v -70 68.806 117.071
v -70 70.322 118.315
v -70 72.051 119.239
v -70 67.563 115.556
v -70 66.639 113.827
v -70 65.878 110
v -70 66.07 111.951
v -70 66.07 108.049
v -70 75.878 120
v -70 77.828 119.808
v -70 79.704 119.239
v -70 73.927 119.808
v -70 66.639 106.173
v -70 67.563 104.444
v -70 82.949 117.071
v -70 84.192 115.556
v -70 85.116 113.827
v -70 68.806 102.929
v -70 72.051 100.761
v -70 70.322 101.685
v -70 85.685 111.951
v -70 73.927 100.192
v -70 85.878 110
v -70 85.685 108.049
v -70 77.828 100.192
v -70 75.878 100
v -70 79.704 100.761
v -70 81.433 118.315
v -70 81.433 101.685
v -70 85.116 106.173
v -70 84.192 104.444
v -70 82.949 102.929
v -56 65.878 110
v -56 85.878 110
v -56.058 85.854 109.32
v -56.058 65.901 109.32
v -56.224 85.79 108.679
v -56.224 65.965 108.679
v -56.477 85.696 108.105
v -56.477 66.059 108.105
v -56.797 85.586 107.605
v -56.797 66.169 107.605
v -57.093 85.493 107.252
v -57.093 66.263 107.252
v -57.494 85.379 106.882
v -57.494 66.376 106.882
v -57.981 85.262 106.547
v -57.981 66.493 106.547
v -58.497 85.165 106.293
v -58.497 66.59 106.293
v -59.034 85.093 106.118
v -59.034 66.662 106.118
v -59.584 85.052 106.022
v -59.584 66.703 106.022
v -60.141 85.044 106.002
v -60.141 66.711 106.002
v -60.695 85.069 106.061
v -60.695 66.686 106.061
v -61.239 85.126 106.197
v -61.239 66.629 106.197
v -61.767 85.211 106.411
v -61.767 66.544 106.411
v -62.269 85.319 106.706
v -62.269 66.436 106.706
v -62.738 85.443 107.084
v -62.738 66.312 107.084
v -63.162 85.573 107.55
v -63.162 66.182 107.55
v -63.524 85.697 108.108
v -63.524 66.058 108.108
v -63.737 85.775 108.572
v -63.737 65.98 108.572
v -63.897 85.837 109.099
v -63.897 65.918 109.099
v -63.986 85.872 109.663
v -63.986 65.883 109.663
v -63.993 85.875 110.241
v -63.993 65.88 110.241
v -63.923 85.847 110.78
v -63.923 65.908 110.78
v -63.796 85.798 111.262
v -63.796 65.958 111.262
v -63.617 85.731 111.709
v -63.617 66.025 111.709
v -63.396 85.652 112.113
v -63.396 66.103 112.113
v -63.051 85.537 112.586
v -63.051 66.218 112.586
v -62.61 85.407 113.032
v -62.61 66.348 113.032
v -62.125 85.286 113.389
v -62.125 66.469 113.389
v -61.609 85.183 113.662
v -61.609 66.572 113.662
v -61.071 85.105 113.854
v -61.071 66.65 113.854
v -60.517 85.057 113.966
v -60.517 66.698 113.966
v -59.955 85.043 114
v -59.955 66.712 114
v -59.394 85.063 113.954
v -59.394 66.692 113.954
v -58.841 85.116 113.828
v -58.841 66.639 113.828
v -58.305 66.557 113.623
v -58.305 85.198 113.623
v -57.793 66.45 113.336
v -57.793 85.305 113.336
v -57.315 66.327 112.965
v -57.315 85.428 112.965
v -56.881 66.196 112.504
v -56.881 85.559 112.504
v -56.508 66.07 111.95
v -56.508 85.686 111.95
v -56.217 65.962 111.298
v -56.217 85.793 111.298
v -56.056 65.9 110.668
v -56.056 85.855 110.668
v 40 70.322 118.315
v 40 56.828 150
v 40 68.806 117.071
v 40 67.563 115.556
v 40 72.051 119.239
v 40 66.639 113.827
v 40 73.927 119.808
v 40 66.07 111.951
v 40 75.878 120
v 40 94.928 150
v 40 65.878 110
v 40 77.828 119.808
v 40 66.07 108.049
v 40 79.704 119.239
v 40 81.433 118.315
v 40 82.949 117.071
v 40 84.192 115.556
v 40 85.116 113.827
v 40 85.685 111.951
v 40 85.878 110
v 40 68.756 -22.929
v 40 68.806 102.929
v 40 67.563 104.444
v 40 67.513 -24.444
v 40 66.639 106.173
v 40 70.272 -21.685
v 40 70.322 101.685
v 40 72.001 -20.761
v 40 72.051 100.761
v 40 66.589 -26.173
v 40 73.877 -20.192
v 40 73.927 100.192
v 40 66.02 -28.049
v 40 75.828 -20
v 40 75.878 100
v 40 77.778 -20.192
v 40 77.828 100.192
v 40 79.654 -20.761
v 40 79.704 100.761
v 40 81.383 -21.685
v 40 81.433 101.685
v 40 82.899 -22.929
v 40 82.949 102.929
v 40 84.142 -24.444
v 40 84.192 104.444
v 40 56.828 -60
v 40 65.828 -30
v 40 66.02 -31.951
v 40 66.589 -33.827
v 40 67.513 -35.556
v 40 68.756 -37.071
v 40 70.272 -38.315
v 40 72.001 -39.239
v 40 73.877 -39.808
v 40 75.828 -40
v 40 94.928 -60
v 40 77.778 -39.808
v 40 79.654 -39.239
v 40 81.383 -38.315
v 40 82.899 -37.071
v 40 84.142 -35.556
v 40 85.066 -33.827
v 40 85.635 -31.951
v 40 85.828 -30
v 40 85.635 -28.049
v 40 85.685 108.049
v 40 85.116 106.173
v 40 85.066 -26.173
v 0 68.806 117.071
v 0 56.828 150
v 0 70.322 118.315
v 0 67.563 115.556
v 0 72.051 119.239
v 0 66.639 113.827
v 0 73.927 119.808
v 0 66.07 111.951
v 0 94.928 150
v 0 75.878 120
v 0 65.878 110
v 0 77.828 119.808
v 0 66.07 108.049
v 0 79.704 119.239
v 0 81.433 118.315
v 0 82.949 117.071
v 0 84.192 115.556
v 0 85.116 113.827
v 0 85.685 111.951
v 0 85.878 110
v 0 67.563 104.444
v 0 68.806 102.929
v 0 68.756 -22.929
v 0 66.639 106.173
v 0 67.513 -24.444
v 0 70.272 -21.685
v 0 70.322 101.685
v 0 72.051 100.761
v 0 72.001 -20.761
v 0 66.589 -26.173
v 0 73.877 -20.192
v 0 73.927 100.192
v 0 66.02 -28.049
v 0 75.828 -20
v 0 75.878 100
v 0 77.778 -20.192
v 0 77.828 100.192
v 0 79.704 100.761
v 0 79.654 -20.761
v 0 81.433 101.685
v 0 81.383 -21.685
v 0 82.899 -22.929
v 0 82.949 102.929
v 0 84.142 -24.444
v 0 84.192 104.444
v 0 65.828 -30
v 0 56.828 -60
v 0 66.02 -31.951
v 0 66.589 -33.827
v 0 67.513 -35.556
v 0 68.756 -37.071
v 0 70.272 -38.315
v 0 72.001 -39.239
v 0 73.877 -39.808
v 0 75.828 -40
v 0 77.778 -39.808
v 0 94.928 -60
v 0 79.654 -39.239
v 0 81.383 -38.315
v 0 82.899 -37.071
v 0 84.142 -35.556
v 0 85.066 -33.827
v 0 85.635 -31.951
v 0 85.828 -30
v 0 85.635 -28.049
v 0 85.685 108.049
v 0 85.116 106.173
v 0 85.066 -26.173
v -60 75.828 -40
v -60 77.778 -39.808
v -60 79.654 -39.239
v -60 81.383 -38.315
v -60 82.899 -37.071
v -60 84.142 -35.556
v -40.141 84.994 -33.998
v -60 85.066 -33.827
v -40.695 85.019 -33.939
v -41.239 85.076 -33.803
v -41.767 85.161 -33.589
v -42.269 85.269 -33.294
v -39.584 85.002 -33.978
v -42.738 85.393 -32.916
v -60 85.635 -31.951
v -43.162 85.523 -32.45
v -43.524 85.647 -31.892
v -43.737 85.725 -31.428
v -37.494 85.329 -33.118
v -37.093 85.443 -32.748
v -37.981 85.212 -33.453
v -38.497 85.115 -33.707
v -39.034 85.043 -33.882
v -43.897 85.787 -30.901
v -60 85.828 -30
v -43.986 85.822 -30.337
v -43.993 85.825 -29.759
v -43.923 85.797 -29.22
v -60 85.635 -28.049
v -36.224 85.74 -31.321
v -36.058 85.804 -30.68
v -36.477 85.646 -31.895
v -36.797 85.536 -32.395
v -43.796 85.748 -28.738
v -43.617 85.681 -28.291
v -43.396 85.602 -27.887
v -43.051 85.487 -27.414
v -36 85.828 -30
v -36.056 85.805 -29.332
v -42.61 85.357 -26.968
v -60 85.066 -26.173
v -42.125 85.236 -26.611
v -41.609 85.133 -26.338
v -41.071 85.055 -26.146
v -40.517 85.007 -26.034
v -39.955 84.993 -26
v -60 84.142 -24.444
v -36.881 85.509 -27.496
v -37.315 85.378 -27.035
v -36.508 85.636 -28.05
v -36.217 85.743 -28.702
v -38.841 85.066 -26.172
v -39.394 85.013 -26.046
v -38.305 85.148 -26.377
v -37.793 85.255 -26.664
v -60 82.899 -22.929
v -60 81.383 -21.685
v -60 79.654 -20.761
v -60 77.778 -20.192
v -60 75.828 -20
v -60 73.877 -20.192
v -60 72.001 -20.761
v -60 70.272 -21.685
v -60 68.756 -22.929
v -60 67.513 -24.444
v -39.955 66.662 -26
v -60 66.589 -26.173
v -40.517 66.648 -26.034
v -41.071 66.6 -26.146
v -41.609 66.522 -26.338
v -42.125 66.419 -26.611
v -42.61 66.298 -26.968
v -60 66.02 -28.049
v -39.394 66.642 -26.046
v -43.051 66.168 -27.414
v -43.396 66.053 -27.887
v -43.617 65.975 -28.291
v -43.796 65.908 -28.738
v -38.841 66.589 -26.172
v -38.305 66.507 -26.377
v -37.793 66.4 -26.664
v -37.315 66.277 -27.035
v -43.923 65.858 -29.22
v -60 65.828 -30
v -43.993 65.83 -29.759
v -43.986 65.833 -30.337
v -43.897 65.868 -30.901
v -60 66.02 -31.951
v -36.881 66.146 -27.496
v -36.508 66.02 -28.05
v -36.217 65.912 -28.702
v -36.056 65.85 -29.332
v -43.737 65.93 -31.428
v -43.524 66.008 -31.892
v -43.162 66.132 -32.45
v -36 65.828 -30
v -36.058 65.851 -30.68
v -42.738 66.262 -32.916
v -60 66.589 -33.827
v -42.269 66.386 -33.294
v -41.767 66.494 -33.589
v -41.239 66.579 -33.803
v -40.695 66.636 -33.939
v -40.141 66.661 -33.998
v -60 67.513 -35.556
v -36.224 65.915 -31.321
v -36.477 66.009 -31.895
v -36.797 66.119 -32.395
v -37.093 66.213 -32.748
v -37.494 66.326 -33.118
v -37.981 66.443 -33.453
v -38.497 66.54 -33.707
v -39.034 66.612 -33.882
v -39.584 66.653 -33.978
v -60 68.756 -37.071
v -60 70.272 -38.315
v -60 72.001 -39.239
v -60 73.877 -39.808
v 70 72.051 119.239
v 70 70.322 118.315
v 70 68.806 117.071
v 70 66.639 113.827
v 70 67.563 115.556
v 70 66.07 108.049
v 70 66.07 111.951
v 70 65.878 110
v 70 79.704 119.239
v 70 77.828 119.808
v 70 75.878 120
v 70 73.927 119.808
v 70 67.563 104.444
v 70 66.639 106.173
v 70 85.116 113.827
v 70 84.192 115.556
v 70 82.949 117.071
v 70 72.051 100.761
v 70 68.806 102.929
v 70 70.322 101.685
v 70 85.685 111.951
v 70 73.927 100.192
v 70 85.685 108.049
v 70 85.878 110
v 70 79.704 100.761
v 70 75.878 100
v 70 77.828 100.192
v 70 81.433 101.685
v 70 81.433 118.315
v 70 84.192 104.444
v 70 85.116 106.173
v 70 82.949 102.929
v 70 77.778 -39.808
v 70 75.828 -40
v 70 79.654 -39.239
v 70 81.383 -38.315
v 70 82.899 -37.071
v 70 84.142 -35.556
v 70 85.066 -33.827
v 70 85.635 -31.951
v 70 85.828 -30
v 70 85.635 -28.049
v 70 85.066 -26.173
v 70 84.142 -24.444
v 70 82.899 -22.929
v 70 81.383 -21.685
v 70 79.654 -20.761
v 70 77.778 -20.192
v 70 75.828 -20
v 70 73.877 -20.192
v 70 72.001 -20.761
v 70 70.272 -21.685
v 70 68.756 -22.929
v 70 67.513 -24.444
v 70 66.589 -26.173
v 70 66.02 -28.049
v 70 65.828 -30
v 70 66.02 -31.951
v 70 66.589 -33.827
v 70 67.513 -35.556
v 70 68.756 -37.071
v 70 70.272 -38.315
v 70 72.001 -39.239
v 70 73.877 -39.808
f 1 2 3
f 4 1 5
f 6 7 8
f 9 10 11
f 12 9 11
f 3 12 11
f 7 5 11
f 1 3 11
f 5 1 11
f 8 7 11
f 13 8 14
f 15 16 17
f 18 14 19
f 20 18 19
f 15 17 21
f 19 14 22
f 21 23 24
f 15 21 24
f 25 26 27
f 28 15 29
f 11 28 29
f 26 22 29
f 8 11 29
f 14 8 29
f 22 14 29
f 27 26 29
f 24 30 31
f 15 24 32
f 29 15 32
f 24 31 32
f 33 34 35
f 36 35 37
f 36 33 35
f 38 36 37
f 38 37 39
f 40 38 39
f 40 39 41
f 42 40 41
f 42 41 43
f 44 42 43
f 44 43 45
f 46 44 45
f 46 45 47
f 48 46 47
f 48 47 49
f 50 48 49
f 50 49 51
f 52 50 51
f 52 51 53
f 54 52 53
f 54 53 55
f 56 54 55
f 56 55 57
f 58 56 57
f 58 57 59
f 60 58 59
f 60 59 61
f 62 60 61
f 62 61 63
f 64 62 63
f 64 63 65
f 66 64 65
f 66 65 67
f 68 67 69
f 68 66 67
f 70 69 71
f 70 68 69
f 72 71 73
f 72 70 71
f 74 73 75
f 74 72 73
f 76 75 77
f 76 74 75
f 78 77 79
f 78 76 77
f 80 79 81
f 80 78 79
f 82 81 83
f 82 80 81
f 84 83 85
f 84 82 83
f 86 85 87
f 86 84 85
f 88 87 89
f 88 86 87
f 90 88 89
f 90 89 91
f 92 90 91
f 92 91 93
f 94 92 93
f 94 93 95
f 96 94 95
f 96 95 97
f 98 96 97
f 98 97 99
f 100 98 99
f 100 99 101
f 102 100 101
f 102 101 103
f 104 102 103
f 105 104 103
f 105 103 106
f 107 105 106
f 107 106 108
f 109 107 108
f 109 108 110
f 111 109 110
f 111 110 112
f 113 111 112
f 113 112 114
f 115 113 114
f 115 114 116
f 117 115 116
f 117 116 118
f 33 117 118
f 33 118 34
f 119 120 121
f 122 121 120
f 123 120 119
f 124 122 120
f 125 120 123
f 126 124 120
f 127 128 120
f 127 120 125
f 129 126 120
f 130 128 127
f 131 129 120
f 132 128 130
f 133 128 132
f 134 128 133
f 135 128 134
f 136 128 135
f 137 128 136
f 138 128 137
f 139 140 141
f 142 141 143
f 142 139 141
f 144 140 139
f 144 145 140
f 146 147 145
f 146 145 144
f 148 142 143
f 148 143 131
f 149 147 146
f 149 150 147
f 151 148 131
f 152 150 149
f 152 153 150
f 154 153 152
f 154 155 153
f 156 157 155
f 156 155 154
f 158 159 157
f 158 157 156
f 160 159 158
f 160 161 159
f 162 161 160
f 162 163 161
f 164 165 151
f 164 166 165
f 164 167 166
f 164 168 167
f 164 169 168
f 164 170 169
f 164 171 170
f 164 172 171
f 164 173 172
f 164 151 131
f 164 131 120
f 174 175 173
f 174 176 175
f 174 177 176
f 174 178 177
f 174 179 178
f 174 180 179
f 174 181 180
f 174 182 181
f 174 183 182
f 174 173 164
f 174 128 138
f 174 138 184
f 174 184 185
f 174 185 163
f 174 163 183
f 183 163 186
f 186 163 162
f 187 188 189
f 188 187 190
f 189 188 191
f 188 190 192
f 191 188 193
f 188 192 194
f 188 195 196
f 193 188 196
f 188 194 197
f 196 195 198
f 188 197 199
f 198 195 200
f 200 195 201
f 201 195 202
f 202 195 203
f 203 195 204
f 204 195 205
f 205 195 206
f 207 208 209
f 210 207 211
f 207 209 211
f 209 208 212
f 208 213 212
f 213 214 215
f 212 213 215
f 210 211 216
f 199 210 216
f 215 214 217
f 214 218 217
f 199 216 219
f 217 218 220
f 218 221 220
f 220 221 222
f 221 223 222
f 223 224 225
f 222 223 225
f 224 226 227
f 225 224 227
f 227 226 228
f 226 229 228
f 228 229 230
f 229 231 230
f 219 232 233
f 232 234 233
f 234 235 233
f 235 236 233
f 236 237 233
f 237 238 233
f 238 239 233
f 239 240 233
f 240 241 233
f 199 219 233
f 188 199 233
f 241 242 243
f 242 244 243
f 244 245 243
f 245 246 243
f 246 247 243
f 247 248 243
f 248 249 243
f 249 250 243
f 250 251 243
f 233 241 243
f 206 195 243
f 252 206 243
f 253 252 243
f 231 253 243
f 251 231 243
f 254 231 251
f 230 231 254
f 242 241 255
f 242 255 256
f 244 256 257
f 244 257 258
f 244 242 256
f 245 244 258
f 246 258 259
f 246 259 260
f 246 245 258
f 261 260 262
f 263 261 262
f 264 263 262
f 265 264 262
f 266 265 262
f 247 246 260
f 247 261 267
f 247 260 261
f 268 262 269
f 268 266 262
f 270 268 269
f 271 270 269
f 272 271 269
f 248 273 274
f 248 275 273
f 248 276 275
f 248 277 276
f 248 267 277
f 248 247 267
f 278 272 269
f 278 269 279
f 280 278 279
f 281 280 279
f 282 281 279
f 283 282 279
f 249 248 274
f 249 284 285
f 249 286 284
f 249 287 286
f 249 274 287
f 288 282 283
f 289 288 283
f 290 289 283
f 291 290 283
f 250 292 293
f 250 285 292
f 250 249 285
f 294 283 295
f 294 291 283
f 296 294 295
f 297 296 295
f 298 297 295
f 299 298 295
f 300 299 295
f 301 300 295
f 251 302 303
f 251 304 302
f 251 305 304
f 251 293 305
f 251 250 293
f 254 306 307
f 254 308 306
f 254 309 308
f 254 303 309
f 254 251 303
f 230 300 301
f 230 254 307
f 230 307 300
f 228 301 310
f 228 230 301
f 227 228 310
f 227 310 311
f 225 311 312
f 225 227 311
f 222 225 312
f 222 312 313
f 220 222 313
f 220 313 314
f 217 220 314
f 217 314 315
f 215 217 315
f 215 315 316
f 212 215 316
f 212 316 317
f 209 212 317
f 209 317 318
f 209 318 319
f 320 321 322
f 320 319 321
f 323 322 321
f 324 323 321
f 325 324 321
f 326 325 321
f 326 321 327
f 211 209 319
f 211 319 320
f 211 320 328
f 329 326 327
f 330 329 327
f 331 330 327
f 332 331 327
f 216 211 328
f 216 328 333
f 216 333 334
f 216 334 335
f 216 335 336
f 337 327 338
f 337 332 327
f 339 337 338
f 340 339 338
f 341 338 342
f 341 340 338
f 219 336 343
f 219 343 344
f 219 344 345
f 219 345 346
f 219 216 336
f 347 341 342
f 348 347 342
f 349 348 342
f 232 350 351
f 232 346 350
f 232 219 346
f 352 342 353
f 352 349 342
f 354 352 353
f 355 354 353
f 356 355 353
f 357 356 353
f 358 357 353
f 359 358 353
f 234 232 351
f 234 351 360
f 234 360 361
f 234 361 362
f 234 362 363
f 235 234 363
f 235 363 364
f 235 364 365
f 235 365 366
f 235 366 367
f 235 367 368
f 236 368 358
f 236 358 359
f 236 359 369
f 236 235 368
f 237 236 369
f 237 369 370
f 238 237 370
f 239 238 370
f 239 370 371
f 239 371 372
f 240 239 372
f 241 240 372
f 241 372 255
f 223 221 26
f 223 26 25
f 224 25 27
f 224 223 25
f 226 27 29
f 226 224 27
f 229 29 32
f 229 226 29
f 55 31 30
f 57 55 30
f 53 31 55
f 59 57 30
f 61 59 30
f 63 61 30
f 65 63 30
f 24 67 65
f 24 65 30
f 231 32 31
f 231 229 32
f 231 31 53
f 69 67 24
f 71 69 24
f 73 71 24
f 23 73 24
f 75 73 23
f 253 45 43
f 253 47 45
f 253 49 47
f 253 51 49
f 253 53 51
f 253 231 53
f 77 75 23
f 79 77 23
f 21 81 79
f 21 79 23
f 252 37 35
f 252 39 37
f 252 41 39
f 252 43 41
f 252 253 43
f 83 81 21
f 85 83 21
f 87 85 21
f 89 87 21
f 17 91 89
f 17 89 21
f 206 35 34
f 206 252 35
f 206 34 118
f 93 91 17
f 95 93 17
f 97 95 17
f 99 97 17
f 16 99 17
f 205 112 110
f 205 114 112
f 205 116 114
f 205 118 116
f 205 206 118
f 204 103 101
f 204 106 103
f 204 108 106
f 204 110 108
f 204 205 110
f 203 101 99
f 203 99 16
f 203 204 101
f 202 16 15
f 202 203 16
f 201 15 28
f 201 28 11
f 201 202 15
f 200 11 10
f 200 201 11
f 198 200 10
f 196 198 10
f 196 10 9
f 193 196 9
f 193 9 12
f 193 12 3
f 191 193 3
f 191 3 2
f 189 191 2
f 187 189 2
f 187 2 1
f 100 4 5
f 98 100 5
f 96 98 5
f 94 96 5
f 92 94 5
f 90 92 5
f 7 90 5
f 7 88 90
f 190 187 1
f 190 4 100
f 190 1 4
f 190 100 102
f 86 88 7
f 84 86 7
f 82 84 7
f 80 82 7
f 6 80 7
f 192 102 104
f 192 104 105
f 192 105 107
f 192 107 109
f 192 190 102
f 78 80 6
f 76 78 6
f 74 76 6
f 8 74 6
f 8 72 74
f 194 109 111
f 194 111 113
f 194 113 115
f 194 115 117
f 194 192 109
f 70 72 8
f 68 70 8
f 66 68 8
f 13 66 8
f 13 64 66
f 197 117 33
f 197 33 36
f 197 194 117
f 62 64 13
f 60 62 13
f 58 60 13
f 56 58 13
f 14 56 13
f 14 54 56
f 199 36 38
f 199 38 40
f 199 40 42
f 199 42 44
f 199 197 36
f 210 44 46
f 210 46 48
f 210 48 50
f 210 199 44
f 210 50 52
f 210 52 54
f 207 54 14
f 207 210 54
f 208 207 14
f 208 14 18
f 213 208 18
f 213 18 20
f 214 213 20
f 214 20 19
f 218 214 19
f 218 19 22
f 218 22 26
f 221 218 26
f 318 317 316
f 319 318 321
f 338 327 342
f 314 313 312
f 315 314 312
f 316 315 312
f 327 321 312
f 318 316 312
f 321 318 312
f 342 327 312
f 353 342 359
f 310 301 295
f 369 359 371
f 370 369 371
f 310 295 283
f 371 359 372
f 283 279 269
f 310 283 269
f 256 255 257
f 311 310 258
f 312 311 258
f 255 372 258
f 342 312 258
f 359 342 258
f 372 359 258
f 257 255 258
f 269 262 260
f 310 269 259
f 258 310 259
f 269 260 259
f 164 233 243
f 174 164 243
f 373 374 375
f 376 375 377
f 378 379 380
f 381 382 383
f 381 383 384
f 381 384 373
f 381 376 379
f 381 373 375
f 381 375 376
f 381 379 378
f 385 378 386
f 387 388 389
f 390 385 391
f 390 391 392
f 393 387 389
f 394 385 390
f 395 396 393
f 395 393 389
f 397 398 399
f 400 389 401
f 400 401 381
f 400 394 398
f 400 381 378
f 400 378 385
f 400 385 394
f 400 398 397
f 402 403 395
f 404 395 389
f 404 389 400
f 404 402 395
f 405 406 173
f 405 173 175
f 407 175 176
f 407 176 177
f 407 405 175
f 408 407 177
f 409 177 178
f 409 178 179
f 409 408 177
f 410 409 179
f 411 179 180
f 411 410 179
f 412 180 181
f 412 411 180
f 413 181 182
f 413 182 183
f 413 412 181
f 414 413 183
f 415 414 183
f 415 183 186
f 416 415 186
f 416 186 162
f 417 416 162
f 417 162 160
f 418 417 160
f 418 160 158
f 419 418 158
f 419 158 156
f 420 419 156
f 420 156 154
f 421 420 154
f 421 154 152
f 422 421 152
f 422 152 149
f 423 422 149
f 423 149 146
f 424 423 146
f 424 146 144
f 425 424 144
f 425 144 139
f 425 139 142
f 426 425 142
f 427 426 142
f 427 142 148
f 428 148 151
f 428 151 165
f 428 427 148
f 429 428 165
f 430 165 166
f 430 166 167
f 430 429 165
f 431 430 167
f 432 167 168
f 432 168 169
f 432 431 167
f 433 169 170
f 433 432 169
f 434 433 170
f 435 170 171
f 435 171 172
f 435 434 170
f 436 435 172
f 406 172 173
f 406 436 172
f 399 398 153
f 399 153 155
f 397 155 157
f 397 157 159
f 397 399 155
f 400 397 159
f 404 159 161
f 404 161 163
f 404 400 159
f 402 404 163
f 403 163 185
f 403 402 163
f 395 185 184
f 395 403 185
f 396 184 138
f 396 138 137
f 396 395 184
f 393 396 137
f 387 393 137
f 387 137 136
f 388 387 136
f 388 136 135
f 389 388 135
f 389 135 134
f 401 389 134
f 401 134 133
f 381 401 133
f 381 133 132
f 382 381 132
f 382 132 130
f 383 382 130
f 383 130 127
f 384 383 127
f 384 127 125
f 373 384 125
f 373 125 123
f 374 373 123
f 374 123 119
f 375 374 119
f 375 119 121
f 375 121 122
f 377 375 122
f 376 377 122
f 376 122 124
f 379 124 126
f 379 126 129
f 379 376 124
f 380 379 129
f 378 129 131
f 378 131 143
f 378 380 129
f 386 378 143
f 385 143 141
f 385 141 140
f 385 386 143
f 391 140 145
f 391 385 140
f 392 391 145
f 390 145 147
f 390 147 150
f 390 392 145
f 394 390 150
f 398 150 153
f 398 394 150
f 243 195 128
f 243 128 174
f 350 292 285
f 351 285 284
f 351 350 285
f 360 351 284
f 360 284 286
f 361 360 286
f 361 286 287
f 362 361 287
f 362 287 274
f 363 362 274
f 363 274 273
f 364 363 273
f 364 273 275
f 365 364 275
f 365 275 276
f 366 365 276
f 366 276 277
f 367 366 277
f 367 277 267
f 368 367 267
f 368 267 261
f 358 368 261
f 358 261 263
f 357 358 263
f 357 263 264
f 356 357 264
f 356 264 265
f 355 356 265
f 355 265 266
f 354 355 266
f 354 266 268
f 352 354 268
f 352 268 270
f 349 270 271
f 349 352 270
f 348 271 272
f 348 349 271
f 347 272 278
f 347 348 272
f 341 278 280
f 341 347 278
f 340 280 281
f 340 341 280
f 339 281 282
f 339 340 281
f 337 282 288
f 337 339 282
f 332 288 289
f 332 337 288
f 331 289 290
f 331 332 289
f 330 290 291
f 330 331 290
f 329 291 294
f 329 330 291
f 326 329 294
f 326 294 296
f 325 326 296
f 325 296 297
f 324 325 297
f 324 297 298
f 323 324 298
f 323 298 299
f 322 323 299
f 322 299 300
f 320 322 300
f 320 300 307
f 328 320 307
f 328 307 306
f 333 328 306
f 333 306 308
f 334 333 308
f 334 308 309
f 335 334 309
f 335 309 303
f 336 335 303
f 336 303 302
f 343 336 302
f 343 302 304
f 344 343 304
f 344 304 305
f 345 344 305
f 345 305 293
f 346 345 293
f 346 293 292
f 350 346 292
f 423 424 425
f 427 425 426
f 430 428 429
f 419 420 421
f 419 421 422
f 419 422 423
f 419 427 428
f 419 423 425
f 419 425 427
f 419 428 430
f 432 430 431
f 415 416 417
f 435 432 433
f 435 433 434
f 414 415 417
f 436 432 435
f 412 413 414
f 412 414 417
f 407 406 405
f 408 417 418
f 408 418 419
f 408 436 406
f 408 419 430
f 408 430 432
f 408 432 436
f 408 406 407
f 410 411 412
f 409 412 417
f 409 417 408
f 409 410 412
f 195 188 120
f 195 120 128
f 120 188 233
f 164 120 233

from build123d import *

# Parameters (mm, degrees)
SKETCH1_W           = 210
SKETCH1_H           = 38.1
BOSS_EXTRUDE1_DEPTH = 40
BOSS_EXTRUDE2_START = 30
SKETCH4_R           = 10
BOSS_EXTRUDE2_DEPTH = 140
CUT_EXTRUDE2_REACH  = 96.928
SKETCH5_R           = 4
BOSS_EXTRUDE3_START = 30
SKETCH2_R           = 10
BOSS_EXTRUDE3_DEPTH = 130
CUT_EXTRUDE3_REACH  = 96.928
SKETCH6_R           = 4


with BuildPart() as part:
    # Sketch1 → Boss-Extrude1 (new body)
    with BuildSketch(Plane(origin=(0, 0, 0), x_dir=(0, 0, -1), z_dir=(1, 0, 0))):
        with Locations((-45, 75.877536232)):
            Rectangle(SKETCH1_W, SKETCH1_H)
    extrude(amount=BOSS_EXTRUDE1_DEPTH)

    # Sketch4 → Boss-Extrude2 (add)
    with BuildSketch(Plane(origin=(40, 0, 0), x_dir=(0, 0, -1), z_dir=(1, 0, 0)).offset(BOSS_EXTRUDE2_START)):
        with Locations((-110, 75.877536232)):
            Circle(SKETCH4_R)
    extrude(amount=-BOSS_EXTRUDE2_DEPTH)

    # Sketch5 → Cut-Extrude2 (cut, up to next)
    with BuildSketch(Plane(origin=(0, 0, 0), x_dir=(1, 0, 0), z_dir=(0, 1, 0)), mode=Mode.PRIVATE) as cut_extrude2_sk1:
        with Locations((-60, -110)):
            Circle(SKETCH5_R)
    cut_extrude2_tool1 = extrude(cut_extrude2_sk1.sketch, amount=CUT_EXTRUDE2_REACH, mode=Mode.PRIVATE) & part.part
    add(cut_extrude2_tool1.solids().sort_by_distance((-60, 0, 110))[0], mode=Mode.SUBTRACT)

    # Sketch2 → Boss-Extrude3 (add)
    with BuildSketch(Plane(origin=(40, 0, 0), x_dir=(0, 0, -1), z_dir=(1, 0, 0)).offset(BOSS_EXTRUDE3_START)):
        with Locations((30, 75.827536232)):
            Circle(SKETCH2_R)
    extrude(amount=-BOSS_EXTRUDE3_DEPTH)

    # Sketch6 → Cut-Extrude3 (cut, up to next)
    with BuildSketch(Plane(origin=(0, 0, 0), x_dir=(1, 0, 0), z_dir=(0, 1, 0)), mode=Mode.PRIVATE) as cut_extrude3_sk1:
        with Locations((-40, 30)):
            Circle(SKETCH6_R)
    cut_extrude3_tool1 = extrude(cut_extrude3_sk1.sketch, amount=CUT_EXTRUDE3_REACH, mode=Mode.PRIVATE) & part.part
    add(cut_extrude3_tool1.solids().sort_by_distance((-40, 0, -30))[0], mode=Mode.SUBTRACT)


solid = part.part
